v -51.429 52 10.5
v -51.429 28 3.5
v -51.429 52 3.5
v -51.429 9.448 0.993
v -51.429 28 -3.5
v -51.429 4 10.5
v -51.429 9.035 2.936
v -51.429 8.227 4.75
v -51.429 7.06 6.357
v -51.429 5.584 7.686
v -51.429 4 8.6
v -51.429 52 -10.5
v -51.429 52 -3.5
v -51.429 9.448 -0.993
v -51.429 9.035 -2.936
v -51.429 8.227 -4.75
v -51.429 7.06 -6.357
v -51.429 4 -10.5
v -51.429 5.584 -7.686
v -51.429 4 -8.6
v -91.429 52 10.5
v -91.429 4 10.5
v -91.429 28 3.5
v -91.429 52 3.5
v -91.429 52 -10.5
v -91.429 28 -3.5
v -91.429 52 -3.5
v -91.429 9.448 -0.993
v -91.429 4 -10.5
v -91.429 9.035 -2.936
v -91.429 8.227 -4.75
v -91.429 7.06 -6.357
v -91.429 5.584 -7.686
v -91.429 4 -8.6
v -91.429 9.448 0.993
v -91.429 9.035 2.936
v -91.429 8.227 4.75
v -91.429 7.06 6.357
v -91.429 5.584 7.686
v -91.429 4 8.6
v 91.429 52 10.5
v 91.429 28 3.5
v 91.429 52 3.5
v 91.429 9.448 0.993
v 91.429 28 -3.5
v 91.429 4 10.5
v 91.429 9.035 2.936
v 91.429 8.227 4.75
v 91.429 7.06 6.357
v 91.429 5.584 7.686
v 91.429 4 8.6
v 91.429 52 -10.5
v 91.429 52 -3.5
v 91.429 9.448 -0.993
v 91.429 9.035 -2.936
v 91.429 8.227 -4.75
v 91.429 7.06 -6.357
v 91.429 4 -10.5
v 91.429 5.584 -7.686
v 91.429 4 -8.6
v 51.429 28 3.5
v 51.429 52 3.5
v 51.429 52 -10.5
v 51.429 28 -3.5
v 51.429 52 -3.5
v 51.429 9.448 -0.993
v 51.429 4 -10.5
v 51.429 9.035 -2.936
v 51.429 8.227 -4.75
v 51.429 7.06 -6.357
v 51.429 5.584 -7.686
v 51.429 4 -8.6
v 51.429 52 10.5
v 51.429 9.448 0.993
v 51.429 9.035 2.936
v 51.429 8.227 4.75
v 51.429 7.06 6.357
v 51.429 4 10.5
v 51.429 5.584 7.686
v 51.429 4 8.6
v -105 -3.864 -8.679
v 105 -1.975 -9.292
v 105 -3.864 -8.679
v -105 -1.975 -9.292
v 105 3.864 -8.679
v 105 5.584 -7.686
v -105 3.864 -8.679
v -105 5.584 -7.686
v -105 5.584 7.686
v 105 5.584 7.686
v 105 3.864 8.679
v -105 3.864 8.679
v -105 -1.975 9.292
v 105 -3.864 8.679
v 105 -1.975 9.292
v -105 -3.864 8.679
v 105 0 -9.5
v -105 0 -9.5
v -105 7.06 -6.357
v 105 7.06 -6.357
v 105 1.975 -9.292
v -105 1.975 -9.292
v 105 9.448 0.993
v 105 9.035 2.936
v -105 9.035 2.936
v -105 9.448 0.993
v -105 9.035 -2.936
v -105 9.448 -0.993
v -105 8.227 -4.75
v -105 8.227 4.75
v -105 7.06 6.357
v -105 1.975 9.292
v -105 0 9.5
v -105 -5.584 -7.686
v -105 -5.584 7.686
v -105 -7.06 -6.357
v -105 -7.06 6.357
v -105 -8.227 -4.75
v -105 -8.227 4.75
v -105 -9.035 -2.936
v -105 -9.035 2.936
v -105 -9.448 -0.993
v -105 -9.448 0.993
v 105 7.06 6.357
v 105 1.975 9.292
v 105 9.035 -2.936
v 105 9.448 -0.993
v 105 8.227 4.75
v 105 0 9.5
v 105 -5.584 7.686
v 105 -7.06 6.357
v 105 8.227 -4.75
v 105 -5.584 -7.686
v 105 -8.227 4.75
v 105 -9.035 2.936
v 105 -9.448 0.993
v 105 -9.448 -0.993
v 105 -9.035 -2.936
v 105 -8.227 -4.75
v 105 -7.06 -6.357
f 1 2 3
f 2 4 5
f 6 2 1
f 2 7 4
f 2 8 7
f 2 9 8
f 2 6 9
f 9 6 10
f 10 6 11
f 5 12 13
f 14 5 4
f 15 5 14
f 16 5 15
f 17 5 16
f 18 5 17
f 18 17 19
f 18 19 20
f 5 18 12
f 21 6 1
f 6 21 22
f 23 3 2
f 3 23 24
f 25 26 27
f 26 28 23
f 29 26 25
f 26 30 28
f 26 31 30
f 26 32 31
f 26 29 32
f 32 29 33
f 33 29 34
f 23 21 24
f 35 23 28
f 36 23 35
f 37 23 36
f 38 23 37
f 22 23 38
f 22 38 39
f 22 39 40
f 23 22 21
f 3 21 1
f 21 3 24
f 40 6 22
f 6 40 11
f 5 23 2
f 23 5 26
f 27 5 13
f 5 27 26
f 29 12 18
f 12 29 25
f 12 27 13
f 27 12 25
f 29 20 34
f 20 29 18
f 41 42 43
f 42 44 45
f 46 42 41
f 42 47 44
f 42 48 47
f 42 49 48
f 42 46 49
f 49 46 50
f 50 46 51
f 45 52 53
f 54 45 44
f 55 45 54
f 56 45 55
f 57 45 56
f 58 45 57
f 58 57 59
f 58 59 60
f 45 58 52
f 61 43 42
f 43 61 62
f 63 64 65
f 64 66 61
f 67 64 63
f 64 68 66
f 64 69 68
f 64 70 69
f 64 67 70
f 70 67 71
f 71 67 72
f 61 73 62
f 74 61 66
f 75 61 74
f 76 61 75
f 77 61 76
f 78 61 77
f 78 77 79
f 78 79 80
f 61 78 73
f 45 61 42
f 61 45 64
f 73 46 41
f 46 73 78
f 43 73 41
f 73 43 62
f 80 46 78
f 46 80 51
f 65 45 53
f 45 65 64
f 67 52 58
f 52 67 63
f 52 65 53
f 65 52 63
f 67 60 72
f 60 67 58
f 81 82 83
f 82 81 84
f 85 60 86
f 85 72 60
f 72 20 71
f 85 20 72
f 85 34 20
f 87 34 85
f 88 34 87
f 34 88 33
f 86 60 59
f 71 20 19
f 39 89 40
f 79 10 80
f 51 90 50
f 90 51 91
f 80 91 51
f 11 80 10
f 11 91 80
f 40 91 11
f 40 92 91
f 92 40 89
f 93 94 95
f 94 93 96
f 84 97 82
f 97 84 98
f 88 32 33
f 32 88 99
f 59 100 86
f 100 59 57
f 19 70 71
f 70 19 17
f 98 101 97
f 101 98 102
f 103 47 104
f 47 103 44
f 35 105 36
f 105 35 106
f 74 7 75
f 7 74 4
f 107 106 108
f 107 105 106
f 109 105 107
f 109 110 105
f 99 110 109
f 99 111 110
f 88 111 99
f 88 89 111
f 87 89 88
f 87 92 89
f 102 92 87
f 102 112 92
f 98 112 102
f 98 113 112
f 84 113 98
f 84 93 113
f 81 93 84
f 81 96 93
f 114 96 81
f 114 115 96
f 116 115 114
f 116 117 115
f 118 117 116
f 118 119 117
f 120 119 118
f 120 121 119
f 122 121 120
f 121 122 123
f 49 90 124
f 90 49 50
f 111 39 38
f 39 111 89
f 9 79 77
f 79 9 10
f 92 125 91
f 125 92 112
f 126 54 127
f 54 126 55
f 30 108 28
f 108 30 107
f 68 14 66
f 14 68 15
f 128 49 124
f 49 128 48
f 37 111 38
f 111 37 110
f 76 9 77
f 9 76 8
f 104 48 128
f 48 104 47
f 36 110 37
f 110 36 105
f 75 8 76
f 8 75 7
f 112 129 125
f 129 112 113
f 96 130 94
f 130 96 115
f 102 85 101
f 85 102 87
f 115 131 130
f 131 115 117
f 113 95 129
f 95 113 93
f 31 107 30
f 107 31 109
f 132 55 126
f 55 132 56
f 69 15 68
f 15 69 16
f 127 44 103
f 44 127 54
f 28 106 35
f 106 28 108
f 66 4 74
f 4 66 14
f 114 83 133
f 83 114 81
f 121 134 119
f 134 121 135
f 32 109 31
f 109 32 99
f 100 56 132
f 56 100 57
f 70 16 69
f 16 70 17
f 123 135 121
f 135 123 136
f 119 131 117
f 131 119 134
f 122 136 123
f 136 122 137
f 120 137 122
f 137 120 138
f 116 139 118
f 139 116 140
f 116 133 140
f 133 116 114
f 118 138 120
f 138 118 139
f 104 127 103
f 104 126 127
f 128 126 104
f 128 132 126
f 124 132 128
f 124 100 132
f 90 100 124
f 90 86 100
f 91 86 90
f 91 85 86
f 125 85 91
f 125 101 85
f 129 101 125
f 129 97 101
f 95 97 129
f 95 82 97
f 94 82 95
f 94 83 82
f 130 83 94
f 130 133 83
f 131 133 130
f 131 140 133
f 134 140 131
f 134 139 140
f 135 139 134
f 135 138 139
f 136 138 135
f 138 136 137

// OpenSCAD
// file: ../robot_settings.scad
main_box_x = 95; // 96
main_box_y = 102;
main_box_z = 74; // 74.5
wall_thickness = 2;

rail_gap = 2;
rail_inset = 7;

rail_thickness = 7;
rail_length = 250;
rail_width = 200;

raspberry_pi_screw_seperation_y = 57;
raspberry_pi_screw_seperation_z = 48;
raspberry_pi_peg_h = 4;

gears_module = 1;
pinion_gear_teeth = 30;
pinion_gear_width = 5;
pinion_gear_bore = 4;

gears_setback_distance = 25;
gear_post_height = 2 * pinion_gear_width + rail_thickness + 8 ;

steering_motor_mount_x = 45;
steering_motor_mount_y = 36;
steering_motor_mount_z = 18;
steering_motor_mount_setback_distance = gears_setback_distance + 16;

dc_motor_drivertype = "Teyleten"; // Teyleten
isAdafruit = (dc_motor_drivertype == "Adafruit");

drv8871_x = isAdafruit ? 20.3 : 21.6;
drv8871_y = isAdafruit ?  24 : 25;

drv8871_z = 2;
drv8871_screw_d = 2.5;
drv8871_solder_points_z = 2;

drv8871mount_edge_x = 1.5;
drv8871mount_edge_wall = 3;
drv8871mount_z = 5;
drv8871mount_x = drv8871_x +  drv8871mount_edge_wall - 2* drv8871mount_edge_x;
drv8871mount_y = 19;

drv8871_screw_distance = 15.64;
drv8871_solder_points_d = 1.66;
drv8871_solder_offset_y = 4.4;
drv8871_solder_inner_points_distance = 5;
drv8871_solder_outer_points_distance = 12;

dc_motor_housing_minus_encoder_z = 48;
dc_motor_encoder_z = 9.33;
dc_motor_encoder_wheel_d = 13.4;
dc_motor_encoder_wheel_thickness = 5;
dc_motor_encoder_wheel_gap = 3;
dc_motor_encoder_circuit_thickness = 2;
dc_motor_cutout_d = 24.8;
dc_motor_cutout_z = 19.5;

dc_motor_screw_head_z = 2;
dc_motor_screw_head_d = 5.6;
dc_motor_screw_d = 3.2;
dc_motor_screw_offset = 8.5;

dc_motor_axle_ring_z = 3;
dc_motor_axle_ring_d = 7.2;
dc_motor_axle_cutout_d = 4.5;
dc_motor_axle_cutout_z = 10;
dc_motor_axle_notch_cutout = 0.4;
dc_motor_axle_notch_cutout_z = 6;

pdmount_x = 20;
pdmount_y = 30;
pdmount_z = 2;
pdmount_edge_x = 1.5;
pdmount_edge_wall = 3;

steering_shaft_z = 45;
steering_shaft_d = 7;
steering_shaft_motor_fitting_d = 9;
coupler_length = 24.6;
coupler_diameter = 14;
coupler_screw_d = 4;
coupler_screw_z_offset = 5;
coupler_gear_side_insert = 12.6;
steering_shaft_with_coupler_z = steering_shaft_z - coupler_gear_side_insert;

lidar_mount_y = 110;
lidar_mount_x = 65 + 20;
lidar_narrow_screws = 40;
lidar_wide_screws = 56;
lidar_front_to_back_screws = 70;
lidar_screw_d = 3;
lidar_circuitboard_x = 20;
lidar_circuitboard_y = 35;
lidar_circuitboard_z = 1.2;
lidar_cord_length = 29;

ball_bearing_height = 7;
ball_bearing_outer_diameter = 22;
ball_bearing_inner_diameter = 8;

pull_bar_radius = 3.3;

rack_module = 1;
rack_length = main_box_x / 2;
rack_height = 10;
rack_width = 10;
rack_teeth = 30;
rack_bore = 3;

// tire hardware
axle_length = 30;
axle_reciever_inner_diameter = 7.75;
axle_reciever_length = 18.8;
axle_notch_length = 7;
axle_notch_cutout = 2.4;

// power distribution bar
power_bar_cutout_x = 96;
power_bar_y = 19.1;
power_bar_z = 1.5;
power_bar_screw_distance = 91.4;
power_bar_screw_d = 2.8;
power_bar_standoff_z = 5;
power_bar_standoff_d = 6.83;

// breadboard
breadboard_wall_thickness = 3;
breadboard_width = 55;
breadboard_length = 83;
breadboard_height = 10.5;
breadboard_notch_width = 3.8;
breadboard_longside_notch_separation = 58.2 - breadboard_notch_width / 2;
breadboard_shortside_notch_separation = 26.3 - breadboard_notch_width;

pico_expander_width = 63;
pico_expander_height = 57;
pico_screw_hole_offset = 3;
pico_screw_hole_d = 2.5;
// main file
   include <../robot_settings.scad>

module clam_pipe() {
      // clam pipe
       translate([0, 0, 0]) {
          rotate([0, 90, 0])
          cylinder(h = rail_width + 10, d = 19, center = true);
       }

       blade_length = 48;
       filling_length = 26;
      
      // clams
       translate([0, 13, 0])
       {
         // right upper clam blade
        translate([-rail_width / 2.8,  15, rail_thickness])
        cube([rail_width / 5,  blade_length, rail_thickness], center = true);
         
         // right filling
         translate([-rail_width / 2.8, 2, -1])
         cube([rail_width / 5, filling_length, rail_thickness + 2], center = true);
         
         // right lower clam blade
        translate([-rail_width / 2.8,  15, -rail_thickness])
        cube([rail_width / 5,  blade_length, rail_thickness], center = true);
         
         // left filling
         translate([rail_width / 2.8, 2, -1])
         cube([rail_width / 5, filling_length, rail_thickness + 2], center = true);
         
        // left upper clam blade
        translate([rail_width / 2.8,  15, rail_thickness])
        cube([rail_width / 5,  blade_length, rail_thickness], center = true);
        
         // left lower clam blade
        translate([rail_width / 2.8,  15, -rail_thickness])
        cube([rail_width / 5,  blade_length, rail_thickness], center = true);
      }
    }
    clam_pipe();
